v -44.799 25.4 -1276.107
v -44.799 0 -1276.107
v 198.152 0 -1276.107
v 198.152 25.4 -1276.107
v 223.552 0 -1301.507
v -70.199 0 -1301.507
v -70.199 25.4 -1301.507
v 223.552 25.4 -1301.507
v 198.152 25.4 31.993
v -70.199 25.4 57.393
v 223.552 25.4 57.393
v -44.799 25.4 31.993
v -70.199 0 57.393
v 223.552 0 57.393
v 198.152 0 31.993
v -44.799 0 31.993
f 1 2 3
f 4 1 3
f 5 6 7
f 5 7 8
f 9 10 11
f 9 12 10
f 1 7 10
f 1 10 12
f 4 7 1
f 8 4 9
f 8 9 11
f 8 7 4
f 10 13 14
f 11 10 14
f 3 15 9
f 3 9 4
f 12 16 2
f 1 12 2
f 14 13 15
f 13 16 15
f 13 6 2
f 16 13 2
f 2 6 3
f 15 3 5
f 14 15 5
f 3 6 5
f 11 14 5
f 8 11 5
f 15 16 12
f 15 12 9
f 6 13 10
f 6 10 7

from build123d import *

# Parameters (mm, degrees)
SKETCH1_W      = 293.751
SKETCH1_H      = 1358.9
SKETCH1_W_2    = 242.951
SKETCH1_H_2    = 1308.1
EXTRUDE1_DEPTH = 25.4


with BuildPart() as part:
    # Sketch1 → Extrude1 (new body)
    with BuildSketch(Plane(origin=(0, 0, 0), x_dir=(1, 0, 0), z_dir=(0, 1, 0))):
        with Locations((76.676652699, 622.056653625)):
            Rectangle(SKETCH1_W, SKETCH1_H)
        with Locations((76.676652699, 622.056653625)):
            Rectangle(SKETCH1_W_2, SKETCH1_H_2, mode=Mode.SUBTRACT)
    extrude(amount=EXTRUDE1_DEPTH)


solid = part.part
